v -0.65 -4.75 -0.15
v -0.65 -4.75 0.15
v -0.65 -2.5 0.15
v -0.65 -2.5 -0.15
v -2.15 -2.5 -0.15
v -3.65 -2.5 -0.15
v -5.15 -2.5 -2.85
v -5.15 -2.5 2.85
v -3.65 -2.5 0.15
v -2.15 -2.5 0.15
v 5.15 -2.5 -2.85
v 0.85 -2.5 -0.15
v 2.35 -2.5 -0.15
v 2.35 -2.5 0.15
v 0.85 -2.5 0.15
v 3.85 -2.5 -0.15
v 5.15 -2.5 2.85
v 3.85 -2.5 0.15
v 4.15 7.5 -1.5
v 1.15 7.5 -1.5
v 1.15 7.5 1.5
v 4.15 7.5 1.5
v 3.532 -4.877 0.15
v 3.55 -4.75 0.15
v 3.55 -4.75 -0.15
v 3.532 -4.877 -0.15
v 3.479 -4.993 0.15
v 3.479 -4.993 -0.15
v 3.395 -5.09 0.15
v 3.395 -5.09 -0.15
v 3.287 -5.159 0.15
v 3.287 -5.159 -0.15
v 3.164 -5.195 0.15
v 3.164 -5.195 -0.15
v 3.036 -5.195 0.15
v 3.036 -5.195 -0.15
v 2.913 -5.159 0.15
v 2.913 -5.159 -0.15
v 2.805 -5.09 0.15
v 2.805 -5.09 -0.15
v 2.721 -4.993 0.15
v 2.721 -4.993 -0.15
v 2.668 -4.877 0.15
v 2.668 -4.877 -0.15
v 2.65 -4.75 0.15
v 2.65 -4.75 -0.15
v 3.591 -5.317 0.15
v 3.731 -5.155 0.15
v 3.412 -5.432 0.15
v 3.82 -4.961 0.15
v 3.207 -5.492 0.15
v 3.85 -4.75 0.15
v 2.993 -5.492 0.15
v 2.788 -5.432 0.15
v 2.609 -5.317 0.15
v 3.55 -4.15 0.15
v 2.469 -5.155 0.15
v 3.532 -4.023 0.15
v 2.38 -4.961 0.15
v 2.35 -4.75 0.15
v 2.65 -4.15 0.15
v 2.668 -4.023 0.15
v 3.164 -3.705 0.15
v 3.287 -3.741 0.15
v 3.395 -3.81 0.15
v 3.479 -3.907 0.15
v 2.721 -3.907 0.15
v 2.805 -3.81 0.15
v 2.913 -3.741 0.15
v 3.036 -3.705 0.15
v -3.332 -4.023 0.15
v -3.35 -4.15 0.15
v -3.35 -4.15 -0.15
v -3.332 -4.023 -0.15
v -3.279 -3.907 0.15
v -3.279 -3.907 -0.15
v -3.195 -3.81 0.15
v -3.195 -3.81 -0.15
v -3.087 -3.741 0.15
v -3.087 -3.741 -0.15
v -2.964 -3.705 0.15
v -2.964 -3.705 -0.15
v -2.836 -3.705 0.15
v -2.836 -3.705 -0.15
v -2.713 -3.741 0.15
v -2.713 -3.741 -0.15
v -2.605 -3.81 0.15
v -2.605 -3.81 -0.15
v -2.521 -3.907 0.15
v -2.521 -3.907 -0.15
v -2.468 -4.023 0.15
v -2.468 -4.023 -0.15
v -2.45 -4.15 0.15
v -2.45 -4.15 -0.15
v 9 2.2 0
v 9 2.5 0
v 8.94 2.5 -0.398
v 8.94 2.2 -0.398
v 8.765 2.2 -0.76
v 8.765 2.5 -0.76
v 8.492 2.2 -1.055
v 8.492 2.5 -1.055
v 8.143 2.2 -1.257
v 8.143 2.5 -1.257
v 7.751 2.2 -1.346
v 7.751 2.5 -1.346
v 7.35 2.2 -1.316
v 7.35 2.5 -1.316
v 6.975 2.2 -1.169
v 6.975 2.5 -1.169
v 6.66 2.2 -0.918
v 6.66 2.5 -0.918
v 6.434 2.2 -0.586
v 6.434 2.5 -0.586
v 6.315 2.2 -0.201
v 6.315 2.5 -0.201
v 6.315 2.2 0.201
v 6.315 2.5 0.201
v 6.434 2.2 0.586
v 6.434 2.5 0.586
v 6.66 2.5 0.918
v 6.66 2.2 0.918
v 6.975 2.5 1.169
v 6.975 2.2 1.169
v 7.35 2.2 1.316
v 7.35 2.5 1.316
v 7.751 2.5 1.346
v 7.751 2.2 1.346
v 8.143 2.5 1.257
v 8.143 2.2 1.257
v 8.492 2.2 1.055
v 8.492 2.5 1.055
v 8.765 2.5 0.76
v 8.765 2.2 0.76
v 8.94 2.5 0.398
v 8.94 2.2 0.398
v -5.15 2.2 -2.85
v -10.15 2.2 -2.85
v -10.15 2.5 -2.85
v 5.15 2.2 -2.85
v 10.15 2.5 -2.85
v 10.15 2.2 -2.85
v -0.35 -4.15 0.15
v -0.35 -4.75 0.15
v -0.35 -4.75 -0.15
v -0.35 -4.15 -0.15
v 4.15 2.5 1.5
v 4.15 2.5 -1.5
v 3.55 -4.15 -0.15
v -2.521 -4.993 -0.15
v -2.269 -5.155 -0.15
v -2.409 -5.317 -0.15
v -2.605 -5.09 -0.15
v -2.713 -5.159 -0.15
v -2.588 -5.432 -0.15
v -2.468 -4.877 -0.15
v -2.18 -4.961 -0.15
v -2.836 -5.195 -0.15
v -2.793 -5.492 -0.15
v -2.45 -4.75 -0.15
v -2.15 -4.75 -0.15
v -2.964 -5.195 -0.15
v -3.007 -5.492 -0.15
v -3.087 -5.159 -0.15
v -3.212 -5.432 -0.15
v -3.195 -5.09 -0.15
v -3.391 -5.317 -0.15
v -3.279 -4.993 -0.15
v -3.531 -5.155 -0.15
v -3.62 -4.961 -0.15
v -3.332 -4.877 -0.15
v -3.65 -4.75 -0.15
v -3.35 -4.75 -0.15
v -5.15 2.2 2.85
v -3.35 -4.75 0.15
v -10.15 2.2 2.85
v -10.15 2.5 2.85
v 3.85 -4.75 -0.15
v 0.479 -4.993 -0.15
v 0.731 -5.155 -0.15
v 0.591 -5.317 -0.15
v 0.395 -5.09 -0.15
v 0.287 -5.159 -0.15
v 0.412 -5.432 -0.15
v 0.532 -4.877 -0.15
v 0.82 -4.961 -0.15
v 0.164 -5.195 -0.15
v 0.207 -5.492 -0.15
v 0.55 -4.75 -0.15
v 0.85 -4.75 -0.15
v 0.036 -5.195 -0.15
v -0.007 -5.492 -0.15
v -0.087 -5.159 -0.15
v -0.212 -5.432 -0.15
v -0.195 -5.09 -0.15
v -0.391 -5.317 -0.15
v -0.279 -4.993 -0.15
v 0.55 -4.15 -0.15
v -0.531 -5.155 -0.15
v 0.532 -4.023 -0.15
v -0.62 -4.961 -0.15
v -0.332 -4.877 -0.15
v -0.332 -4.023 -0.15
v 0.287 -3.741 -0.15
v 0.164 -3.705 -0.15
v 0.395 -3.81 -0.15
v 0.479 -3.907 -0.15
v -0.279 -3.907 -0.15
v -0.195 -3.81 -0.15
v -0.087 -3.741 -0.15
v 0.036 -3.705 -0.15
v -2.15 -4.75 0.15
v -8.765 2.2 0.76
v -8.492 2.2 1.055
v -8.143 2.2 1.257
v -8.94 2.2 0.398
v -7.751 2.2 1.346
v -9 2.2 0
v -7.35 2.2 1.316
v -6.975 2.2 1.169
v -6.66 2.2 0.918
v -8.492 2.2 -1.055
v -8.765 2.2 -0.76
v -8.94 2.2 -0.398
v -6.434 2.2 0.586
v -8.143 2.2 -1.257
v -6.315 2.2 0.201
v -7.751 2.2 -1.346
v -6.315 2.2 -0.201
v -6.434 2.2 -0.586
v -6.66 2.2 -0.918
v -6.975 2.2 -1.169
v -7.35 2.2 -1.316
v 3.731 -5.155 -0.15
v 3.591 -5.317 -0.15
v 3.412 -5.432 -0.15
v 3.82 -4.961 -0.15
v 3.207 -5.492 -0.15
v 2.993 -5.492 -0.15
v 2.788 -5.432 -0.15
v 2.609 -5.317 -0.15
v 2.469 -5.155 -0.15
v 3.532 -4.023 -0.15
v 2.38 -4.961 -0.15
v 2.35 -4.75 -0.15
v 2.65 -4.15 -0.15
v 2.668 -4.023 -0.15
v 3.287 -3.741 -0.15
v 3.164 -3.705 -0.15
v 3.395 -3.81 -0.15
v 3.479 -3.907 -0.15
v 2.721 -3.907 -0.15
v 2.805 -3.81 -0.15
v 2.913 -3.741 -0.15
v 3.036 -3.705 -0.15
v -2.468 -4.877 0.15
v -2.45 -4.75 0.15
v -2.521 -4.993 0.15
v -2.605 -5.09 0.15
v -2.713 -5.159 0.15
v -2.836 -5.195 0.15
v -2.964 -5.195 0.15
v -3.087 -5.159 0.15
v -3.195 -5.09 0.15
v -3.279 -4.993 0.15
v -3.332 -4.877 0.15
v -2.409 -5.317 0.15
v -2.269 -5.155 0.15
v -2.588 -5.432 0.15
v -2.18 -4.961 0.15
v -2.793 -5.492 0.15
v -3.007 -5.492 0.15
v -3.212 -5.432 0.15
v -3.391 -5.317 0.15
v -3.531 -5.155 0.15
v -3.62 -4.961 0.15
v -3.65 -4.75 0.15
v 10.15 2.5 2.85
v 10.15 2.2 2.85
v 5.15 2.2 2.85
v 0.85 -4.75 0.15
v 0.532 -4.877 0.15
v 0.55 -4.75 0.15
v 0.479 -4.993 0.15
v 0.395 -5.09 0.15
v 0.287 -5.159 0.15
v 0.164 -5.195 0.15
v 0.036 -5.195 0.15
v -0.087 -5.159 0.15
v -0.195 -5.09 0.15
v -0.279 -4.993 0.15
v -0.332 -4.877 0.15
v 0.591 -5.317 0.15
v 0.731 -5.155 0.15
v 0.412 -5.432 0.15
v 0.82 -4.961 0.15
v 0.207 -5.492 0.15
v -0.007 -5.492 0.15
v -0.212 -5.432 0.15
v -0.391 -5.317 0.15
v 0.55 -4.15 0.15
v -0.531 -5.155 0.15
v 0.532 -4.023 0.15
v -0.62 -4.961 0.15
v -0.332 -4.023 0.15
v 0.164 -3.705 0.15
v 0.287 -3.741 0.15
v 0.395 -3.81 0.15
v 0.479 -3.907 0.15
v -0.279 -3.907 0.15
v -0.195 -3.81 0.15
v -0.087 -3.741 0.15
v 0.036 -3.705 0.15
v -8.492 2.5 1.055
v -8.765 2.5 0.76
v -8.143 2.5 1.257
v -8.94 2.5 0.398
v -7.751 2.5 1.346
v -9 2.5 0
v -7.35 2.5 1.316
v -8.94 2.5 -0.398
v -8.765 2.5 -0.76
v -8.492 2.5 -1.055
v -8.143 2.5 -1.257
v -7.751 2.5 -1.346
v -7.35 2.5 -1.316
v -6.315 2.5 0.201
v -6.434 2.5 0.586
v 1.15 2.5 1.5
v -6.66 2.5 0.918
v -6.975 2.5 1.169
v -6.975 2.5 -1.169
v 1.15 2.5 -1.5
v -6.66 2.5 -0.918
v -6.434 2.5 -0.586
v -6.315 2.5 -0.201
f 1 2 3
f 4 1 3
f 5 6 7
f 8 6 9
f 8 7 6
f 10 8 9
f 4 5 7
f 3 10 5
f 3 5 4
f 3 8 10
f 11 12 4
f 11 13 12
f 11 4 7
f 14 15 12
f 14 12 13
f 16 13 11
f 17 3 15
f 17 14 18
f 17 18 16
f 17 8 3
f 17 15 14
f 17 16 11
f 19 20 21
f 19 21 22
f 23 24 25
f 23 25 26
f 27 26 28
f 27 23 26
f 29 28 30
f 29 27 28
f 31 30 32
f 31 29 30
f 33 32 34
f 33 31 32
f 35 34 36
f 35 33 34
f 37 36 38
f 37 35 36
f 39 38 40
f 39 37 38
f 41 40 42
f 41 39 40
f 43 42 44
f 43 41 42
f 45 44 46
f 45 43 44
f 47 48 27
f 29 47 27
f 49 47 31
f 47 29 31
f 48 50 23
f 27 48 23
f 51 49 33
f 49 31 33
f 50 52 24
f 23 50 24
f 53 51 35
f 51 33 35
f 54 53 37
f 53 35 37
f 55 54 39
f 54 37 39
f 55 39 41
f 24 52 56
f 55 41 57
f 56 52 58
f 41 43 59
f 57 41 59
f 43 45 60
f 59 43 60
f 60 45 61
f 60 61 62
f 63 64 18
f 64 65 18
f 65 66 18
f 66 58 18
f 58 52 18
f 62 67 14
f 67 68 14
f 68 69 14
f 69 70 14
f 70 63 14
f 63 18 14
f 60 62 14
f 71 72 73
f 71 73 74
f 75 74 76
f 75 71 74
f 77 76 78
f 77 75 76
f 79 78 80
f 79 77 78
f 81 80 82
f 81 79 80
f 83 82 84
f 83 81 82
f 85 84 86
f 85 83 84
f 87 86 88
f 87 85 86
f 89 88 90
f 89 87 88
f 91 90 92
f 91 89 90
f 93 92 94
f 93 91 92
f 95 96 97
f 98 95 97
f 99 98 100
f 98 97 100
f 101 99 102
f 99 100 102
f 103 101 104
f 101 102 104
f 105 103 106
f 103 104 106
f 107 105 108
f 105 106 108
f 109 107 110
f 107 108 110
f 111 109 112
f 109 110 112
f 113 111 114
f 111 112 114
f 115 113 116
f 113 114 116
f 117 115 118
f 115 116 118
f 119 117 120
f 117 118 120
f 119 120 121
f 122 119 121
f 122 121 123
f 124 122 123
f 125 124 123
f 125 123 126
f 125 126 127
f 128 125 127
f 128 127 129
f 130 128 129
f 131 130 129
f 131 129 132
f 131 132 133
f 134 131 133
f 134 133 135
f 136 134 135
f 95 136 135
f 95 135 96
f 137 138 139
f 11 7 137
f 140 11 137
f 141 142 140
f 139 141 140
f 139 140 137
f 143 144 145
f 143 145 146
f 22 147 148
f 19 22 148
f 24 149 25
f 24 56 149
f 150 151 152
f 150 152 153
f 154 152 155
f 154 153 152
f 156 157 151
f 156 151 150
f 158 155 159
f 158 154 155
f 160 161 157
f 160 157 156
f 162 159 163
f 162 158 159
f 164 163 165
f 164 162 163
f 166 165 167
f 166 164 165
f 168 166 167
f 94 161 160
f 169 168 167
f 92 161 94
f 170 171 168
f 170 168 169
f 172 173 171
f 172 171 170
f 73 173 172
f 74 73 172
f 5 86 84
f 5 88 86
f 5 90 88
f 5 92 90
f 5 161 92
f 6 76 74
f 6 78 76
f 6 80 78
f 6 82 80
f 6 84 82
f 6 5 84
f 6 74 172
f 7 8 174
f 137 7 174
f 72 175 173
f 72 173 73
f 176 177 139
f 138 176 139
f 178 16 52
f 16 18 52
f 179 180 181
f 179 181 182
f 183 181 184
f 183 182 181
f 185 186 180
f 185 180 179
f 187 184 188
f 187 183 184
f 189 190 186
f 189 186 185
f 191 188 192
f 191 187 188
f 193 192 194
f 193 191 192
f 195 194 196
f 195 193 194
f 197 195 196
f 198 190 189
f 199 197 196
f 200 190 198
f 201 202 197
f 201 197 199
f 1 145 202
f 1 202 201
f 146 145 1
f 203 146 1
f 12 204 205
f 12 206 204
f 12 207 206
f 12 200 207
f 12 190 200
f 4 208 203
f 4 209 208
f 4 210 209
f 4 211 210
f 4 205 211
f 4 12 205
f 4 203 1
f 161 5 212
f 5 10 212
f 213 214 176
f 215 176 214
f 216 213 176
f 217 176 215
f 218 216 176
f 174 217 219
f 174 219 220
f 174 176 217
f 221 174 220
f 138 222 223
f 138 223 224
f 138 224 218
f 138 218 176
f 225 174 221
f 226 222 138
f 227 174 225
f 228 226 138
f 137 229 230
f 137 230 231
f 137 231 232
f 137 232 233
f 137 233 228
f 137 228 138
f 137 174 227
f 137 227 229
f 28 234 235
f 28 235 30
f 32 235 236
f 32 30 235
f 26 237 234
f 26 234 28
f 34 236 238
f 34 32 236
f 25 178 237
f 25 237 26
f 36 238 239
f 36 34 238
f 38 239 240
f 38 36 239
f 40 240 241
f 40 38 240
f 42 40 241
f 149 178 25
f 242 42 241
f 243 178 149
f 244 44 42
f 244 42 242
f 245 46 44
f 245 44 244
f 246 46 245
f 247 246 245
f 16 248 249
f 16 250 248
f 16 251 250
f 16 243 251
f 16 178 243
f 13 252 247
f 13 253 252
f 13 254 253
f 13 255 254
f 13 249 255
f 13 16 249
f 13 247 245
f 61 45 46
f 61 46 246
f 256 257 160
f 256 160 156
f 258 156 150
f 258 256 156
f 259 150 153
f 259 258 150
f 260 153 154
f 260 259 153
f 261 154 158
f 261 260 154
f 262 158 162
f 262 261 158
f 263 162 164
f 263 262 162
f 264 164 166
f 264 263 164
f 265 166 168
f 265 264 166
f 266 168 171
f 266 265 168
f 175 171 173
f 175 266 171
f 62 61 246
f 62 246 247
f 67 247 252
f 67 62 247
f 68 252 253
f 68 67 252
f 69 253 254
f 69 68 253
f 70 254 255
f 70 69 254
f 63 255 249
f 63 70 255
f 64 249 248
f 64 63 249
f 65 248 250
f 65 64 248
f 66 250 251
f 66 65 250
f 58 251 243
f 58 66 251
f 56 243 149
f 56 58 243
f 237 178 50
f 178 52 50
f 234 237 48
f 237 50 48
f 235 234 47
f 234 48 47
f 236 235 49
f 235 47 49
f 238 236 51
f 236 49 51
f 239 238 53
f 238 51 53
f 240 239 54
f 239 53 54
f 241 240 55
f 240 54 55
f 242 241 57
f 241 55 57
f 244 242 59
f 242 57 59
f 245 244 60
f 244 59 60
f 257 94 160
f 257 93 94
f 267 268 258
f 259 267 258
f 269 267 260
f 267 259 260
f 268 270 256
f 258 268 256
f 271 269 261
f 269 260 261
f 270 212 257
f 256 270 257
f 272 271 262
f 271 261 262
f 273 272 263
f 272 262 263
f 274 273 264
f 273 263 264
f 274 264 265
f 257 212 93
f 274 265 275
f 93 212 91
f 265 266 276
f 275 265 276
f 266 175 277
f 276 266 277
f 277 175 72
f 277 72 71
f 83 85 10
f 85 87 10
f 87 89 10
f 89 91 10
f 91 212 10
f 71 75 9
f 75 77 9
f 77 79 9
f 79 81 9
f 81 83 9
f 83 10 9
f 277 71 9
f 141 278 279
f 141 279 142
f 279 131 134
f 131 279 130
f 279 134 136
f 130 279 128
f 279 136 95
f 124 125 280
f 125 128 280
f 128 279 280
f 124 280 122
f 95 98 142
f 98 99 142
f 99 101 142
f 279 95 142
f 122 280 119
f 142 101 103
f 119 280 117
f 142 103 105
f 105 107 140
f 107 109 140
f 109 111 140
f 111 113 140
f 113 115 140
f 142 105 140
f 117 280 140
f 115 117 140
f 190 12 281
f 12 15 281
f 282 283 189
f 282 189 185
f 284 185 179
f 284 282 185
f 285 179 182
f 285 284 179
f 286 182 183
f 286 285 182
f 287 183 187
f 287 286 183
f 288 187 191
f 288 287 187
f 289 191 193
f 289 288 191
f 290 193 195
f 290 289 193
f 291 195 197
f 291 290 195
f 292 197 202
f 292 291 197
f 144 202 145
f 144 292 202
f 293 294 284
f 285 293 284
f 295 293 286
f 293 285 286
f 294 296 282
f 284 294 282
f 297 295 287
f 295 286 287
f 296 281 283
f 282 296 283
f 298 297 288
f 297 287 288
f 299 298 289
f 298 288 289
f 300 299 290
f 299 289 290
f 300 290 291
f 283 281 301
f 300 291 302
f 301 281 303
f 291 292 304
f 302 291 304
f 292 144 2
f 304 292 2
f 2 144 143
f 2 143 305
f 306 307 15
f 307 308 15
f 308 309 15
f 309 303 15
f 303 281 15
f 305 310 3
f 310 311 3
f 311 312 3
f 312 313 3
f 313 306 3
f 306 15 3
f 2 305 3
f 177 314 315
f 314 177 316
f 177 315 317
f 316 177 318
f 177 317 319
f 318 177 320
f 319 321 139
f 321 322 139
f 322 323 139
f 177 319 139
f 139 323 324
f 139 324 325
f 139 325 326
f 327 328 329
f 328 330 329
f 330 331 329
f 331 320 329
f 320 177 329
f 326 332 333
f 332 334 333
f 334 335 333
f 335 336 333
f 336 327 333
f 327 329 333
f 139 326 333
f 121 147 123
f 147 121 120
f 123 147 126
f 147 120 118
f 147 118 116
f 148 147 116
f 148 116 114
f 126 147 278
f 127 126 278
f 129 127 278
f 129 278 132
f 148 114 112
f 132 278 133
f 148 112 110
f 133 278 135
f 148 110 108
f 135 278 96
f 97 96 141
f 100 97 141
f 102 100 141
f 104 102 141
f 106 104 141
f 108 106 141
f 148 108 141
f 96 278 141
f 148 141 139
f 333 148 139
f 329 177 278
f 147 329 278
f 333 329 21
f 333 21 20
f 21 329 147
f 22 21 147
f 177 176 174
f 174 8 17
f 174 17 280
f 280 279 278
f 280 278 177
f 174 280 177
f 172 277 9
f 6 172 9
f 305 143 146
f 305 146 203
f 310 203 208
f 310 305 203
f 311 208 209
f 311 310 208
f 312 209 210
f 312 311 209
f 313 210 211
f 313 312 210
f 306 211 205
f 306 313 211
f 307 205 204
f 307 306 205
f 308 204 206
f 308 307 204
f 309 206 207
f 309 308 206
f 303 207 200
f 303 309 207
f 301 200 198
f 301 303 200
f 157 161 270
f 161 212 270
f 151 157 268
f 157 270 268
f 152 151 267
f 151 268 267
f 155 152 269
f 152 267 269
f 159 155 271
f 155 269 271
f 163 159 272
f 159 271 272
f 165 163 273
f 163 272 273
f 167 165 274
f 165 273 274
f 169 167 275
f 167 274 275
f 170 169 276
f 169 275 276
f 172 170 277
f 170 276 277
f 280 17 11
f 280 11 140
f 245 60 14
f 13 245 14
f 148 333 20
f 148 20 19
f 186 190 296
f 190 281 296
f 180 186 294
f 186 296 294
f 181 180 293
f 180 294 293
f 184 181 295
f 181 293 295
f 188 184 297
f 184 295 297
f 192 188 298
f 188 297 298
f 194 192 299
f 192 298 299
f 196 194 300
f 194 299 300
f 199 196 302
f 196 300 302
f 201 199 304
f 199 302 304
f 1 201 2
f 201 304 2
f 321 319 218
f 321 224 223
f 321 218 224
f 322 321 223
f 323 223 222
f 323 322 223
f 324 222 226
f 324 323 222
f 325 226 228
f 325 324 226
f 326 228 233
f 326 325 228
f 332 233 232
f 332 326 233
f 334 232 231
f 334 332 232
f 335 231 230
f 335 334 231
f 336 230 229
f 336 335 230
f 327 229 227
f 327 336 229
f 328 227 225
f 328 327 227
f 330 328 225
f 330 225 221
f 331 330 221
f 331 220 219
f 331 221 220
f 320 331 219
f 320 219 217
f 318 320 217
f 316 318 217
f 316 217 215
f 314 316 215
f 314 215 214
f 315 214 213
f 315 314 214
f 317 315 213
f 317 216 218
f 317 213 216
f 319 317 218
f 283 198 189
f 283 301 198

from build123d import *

# Parameters (mm, degrees)
SKETCH1_W           = 10.3
SKETCH1_H           = 5
BOSS_EXTRUDE1_DEPTH = 2.85
SKETCH2_W           = 5.7
SKETCH2_H           = 0.3
BOSS_EXTRUDE2_DEPTH = 5
SKETCH3_R           = 1.35
CUT_EXTRUDE1_DEPTH  = 5
SKETCH4_W           = 3
SKETCH4_H           = 3
BOSS_EXTRUDE3_DEPTH = 5
BOSS_EXTRUDE4_DEPTH = 0.15
LPATTERN1_COUNT     = 3
LPATTERN1_PITCH     = 3


with BuildPart() as part:
    # Sketch1 → Boss-Extrude1 (new body, symmetric)
    with BuildSketch(Plane.XY):
        Rectangle(SKETCH1_W, SKETCH1_H)
    extrude(amount=BOSS_EXTRUDE1_DEPTH, both=True)

    # Sketch2 → Boss-Extrude2 (add)
    with BuildSketch(Plane(origin=(5.15, 0, 0), x_dir=(0, 0, -1), z_dir=(1, 0, 0))):
        with Locations((0, 2.35)):
            Rectangle(SKETCH2_W, SKETCH2_H)
    boss_extrude2 = extrude(amount=BOSS_EXTRUDE2_DEPTH)

    # Sketch3 → Cut-Extrude1 (cut)
    with BuildSketch(Plane(origin=(0, 2.5, 0), x_dir=(1, 0, 0), z_dir=(0, 1, 0))):
        with Locations((7.65, 0)):
            Circle(SKETCH3_R)
    cut_extrude1 = extrude(amount=-CUT_EXTRUDE1_DEPTH, mode=Mode.SUBTRACT)

    # Mirror1: Boss-Extrude2, Cut-Extrude1 across plane
    add(boss_extrude2.mirror(Plane(origin=(0, 0, 0), x_dir=(0, 0, 1), z_dir=(1, 0, 0))))
    add(cut_extrude1.mirror(Plane(origin=(0, 0, 0), x_dir=(0, 0, 1), z_dir=(1, 0, 0))), mode=Mode.SUBTRACT)

    # Sketch4 → Boss-Extrude3 (add)
    with BuildSketch(Plane(origin=(0, 2.5, 0), x_dir=(1, 0, 0), z_dir=(0, 1, 0))):
        with Locations((2.65, 0)):
            Rectangle(SKETCH4_W, SKETCH4_H)
    extrude(amount=BOSS_EXTRUDE3_DEPTH)

    # Sketch5 → Boss-Extrude4 (add, symmetric)
    with BuildSketch(Plane.XY):
        with BuildLine():
            Line((-3.65, -2.5), (-2.15, -2.5))
            Line((-2.15, -2.5), (-2.15, -4.75))
            ThreePointArc((-2.15, -4.75), (-2.9, -5.5), (-3.65, -4.75))
            Line((-3.65, -4.75), (-3.65, -2.5))
        make_face()
        with BuildLine():
            Line((-2.45, -4.15), (-2.45, -4.75))
            ThreePointArc((-2.45, -4.75), (-2.9, -5.2), (-3.35, -4.75))
            Line((-3.35, -4.75), (-3.35, -4.15))
            ThreePointArc((-3.35, -4.15), (-2.9, -3.7), (-2.45, -4.15))
        make_face(mode=Mode.SUBTRACT)
    boss_extrude4 = extrude(amount=BOSS_EXTRUDE4_DEPTH, both=True)

    # LPattern1: Boss-Extrude4 ×3
    with Locations(*[(i * LPATTERN1_PITCH, 0, 0) for i in range(1, LPATTERN1_COUNT)]):
        add(boss_extrude4)


solid = part.part
